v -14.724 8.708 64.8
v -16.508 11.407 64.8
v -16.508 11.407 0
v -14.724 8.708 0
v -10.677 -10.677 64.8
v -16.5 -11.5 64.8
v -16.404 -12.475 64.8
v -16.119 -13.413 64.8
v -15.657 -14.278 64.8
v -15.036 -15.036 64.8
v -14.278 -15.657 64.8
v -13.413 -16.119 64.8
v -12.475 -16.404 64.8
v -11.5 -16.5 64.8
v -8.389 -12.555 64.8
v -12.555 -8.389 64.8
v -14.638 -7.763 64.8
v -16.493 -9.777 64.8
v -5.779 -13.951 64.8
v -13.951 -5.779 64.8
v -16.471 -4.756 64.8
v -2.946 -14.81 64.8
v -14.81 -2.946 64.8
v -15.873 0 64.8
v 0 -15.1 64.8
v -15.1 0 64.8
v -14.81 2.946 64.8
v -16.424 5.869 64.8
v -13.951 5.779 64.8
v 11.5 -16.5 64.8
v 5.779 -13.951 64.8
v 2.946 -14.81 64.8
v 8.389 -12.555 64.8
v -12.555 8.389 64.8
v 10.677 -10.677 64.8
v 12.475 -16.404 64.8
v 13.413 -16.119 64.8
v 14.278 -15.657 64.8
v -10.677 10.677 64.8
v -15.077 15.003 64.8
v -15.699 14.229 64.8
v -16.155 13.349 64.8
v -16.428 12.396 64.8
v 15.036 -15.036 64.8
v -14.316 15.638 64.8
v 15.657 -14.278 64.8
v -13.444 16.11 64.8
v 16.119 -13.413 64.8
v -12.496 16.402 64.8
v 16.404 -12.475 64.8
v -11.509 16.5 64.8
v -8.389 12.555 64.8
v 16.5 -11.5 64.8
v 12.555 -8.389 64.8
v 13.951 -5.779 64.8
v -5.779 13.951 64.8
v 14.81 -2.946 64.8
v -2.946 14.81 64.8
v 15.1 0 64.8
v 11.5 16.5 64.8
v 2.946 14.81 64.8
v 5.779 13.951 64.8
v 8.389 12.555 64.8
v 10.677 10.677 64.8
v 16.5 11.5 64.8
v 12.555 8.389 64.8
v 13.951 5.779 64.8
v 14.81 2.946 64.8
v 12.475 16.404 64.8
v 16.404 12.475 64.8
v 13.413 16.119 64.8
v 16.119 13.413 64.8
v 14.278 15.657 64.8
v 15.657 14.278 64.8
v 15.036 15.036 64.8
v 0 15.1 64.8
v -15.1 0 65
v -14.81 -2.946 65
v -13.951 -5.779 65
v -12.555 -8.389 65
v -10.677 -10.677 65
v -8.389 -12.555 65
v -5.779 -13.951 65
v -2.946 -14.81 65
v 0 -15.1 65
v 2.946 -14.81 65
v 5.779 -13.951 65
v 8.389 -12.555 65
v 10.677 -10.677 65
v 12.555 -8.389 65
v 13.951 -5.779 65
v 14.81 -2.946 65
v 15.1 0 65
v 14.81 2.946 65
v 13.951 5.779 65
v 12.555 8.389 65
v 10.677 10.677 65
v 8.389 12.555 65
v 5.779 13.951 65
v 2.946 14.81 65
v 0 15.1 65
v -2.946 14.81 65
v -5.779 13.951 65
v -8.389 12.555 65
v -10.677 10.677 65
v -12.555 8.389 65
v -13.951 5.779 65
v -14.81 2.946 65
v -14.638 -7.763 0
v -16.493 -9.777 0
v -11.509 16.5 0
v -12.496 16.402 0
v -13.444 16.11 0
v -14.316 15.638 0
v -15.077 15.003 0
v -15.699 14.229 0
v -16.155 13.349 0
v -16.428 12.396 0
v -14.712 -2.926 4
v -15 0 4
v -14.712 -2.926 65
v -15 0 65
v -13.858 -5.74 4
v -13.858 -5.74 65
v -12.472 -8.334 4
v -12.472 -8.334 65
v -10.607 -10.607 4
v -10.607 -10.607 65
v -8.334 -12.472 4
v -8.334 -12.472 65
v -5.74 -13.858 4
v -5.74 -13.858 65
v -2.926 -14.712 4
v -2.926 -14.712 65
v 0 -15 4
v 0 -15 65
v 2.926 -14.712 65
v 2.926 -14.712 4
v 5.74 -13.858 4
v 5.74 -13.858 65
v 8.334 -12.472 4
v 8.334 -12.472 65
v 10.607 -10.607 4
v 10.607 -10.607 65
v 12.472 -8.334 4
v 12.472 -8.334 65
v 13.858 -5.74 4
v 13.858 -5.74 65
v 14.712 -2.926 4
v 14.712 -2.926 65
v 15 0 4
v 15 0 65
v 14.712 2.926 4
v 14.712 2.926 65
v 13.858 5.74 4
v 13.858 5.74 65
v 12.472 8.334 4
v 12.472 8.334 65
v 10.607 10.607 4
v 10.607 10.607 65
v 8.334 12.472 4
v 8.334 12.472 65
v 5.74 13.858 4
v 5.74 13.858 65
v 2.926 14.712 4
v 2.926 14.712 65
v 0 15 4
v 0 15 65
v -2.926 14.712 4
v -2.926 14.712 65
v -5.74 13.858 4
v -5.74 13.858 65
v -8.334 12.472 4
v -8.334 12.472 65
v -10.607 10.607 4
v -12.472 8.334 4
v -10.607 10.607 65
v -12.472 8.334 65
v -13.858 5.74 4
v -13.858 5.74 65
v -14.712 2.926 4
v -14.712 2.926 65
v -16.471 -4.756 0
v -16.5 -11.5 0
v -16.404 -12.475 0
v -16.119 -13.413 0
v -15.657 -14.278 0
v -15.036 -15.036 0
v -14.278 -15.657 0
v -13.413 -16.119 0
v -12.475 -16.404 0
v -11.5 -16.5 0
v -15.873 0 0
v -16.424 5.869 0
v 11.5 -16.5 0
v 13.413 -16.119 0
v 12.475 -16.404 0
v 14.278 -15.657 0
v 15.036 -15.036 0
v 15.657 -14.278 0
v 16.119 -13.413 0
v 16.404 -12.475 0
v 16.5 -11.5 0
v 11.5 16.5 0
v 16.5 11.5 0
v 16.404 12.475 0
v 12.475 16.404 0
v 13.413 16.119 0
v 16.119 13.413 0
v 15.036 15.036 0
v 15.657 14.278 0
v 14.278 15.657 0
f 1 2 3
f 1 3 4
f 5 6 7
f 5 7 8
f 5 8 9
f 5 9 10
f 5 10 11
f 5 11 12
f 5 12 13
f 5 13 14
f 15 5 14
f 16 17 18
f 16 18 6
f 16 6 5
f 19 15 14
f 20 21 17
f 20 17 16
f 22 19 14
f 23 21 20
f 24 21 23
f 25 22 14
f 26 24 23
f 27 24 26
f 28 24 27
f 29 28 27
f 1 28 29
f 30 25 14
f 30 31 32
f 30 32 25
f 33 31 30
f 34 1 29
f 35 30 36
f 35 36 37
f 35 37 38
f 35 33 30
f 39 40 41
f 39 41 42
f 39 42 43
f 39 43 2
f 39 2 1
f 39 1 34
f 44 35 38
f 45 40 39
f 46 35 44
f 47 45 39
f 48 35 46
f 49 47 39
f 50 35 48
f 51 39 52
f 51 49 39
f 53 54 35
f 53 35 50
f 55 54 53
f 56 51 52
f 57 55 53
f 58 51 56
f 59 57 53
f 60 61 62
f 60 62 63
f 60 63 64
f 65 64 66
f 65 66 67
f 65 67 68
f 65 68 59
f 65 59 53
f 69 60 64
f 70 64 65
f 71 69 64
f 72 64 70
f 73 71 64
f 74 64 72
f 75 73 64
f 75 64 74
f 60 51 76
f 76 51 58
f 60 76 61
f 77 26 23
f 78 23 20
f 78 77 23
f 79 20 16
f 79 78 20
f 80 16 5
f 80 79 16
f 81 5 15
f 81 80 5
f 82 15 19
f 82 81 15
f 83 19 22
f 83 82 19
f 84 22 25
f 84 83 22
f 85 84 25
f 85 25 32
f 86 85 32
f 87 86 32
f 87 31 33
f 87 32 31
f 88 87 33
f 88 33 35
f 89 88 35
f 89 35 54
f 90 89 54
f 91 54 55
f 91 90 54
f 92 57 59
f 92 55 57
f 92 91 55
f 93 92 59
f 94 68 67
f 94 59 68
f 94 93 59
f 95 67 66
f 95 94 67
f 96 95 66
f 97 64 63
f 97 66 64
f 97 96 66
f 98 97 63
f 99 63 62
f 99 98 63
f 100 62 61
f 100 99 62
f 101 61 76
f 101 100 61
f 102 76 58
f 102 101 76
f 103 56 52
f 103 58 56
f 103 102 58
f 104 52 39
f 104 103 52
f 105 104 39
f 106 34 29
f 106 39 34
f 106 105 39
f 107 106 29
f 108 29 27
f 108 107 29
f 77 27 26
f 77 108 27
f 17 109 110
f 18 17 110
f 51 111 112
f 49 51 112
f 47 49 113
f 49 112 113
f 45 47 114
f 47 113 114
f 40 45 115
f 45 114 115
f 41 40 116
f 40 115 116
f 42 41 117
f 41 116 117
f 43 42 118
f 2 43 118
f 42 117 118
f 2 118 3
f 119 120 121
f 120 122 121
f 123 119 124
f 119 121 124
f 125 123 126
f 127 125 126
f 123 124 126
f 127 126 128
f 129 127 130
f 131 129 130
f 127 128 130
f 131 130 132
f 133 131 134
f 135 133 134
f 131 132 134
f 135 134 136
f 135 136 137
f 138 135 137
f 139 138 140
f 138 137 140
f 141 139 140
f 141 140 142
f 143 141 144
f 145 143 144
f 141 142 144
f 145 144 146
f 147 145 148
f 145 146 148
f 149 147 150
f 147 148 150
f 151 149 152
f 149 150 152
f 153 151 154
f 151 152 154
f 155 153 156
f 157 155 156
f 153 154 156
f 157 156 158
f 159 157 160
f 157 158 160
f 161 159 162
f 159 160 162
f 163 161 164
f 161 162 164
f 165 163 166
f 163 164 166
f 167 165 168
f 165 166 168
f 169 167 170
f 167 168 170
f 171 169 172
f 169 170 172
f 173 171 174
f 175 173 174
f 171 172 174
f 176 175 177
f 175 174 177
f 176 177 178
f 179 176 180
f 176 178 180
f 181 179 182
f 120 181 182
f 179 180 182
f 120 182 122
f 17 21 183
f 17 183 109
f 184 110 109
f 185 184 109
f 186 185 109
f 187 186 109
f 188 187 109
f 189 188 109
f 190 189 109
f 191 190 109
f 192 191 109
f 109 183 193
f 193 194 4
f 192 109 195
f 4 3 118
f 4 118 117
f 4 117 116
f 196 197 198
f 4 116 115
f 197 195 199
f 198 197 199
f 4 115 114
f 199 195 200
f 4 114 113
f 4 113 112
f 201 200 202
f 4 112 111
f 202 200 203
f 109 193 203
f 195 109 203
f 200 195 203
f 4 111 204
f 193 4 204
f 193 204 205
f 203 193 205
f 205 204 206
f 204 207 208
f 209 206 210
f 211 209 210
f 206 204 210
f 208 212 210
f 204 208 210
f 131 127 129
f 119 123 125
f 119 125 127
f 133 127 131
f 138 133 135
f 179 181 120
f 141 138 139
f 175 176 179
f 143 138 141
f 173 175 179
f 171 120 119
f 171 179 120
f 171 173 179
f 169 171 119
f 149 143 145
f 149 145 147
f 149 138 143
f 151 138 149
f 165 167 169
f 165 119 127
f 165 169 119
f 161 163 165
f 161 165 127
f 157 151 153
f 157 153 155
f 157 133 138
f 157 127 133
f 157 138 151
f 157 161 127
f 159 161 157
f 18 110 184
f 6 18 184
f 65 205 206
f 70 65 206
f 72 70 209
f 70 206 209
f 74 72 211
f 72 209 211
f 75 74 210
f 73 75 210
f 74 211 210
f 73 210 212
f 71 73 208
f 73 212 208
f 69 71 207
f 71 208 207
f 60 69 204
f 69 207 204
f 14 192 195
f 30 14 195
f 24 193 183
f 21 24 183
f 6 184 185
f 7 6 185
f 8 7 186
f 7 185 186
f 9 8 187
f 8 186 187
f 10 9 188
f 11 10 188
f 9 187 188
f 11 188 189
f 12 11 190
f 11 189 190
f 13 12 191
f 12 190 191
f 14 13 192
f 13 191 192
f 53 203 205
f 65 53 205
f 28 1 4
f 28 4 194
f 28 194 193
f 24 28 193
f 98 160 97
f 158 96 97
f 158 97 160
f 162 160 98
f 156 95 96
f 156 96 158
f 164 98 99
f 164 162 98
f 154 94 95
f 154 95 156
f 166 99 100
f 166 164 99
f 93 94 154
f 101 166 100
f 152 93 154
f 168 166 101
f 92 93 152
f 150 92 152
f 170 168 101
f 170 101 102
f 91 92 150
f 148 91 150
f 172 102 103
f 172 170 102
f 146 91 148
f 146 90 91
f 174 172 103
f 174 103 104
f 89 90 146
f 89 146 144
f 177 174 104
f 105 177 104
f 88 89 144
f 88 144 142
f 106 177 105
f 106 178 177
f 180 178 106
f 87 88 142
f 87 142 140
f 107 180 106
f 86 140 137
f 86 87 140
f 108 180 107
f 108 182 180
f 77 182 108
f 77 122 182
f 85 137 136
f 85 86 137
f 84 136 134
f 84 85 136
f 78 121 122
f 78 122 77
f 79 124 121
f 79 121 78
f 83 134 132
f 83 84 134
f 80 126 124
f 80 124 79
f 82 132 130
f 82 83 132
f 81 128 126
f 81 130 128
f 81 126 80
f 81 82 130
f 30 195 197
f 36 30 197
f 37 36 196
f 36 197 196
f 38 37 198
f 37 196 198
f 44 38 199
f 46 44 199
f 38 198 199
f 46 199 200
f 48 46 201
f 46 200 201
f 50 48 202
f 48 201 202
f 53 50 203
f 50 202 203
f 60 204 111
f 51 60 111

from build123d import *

# Parameters (mm, degrees)
F0_W     = 0.1
F0_H     = 65
F2_R     = 15.1
F3_DEPTH = 64.8
F4_R     = 15.089878
F5_DEPTH = 4


with BuildPart() as f1:
    # F0 (on Front) → F1 (revolve)
    with BuildSketch(Plane.XZ):
        with Locations((-15.05, 32.5)):
            Rectangle(F0_W, F0_H)
    revolve(axis=Axis((0, 0, 13.169291), (0, 0, 1)))

    # F2 (on Top) → F3 (join)
    with BuildSketch(Plane.XY):
        with BuildLine():
            Line((-11.5, -16.5), (11.5, -16.5))
            ThreePointArc((11.5, -16.5), (15.035534, -15.035534), (16.5, -11.5))
            Line((16.5, -11.5), (16.5, 11.5))
            ThreePointArc((16.5, 11.5), (15.035534, 15.035534), (11.5, 16.5))
            Line((11.5, 16.5), (-11.509184, 16.5))
            ThreePointArc((-11.509184, 16.5), (-15.07744, 15.002506), (-16.508319, 11.407019))
            Line((-16.508319, 11.407019), (-14.724482, 8.708321))
            Line((-14.724482, 8.708321), (-16.424482, 5.869184))
            Line((-16.424482, 5.869184), (-15.872665, 0))
            Line((-15.872665, 0), (-16.470676, -4.755567))
            Line((-16.470676, -4.755567), (-14.637756, -7.762516))
            Line((-14.637756, -7.762516), (-16.492511, -9.777418))
            Line((-16.492511, -9.777418), (-16.5, -11.5))
            ThreePointArc((-16.5, -11.5), (-15.035534, -15.035534), (-11.5, -16.5))
        make_face()
        Circle(F2_R, mode=Mode.SUBTRACT)
    extrude(amount=F3_DEPTH)

    # F4 (on Top) → F5 (join)
    with BuildSketch(Plane.XY):
        Circle(F4_R)
    extrude(amount=F5_DEPTH)


solid = f1.part
